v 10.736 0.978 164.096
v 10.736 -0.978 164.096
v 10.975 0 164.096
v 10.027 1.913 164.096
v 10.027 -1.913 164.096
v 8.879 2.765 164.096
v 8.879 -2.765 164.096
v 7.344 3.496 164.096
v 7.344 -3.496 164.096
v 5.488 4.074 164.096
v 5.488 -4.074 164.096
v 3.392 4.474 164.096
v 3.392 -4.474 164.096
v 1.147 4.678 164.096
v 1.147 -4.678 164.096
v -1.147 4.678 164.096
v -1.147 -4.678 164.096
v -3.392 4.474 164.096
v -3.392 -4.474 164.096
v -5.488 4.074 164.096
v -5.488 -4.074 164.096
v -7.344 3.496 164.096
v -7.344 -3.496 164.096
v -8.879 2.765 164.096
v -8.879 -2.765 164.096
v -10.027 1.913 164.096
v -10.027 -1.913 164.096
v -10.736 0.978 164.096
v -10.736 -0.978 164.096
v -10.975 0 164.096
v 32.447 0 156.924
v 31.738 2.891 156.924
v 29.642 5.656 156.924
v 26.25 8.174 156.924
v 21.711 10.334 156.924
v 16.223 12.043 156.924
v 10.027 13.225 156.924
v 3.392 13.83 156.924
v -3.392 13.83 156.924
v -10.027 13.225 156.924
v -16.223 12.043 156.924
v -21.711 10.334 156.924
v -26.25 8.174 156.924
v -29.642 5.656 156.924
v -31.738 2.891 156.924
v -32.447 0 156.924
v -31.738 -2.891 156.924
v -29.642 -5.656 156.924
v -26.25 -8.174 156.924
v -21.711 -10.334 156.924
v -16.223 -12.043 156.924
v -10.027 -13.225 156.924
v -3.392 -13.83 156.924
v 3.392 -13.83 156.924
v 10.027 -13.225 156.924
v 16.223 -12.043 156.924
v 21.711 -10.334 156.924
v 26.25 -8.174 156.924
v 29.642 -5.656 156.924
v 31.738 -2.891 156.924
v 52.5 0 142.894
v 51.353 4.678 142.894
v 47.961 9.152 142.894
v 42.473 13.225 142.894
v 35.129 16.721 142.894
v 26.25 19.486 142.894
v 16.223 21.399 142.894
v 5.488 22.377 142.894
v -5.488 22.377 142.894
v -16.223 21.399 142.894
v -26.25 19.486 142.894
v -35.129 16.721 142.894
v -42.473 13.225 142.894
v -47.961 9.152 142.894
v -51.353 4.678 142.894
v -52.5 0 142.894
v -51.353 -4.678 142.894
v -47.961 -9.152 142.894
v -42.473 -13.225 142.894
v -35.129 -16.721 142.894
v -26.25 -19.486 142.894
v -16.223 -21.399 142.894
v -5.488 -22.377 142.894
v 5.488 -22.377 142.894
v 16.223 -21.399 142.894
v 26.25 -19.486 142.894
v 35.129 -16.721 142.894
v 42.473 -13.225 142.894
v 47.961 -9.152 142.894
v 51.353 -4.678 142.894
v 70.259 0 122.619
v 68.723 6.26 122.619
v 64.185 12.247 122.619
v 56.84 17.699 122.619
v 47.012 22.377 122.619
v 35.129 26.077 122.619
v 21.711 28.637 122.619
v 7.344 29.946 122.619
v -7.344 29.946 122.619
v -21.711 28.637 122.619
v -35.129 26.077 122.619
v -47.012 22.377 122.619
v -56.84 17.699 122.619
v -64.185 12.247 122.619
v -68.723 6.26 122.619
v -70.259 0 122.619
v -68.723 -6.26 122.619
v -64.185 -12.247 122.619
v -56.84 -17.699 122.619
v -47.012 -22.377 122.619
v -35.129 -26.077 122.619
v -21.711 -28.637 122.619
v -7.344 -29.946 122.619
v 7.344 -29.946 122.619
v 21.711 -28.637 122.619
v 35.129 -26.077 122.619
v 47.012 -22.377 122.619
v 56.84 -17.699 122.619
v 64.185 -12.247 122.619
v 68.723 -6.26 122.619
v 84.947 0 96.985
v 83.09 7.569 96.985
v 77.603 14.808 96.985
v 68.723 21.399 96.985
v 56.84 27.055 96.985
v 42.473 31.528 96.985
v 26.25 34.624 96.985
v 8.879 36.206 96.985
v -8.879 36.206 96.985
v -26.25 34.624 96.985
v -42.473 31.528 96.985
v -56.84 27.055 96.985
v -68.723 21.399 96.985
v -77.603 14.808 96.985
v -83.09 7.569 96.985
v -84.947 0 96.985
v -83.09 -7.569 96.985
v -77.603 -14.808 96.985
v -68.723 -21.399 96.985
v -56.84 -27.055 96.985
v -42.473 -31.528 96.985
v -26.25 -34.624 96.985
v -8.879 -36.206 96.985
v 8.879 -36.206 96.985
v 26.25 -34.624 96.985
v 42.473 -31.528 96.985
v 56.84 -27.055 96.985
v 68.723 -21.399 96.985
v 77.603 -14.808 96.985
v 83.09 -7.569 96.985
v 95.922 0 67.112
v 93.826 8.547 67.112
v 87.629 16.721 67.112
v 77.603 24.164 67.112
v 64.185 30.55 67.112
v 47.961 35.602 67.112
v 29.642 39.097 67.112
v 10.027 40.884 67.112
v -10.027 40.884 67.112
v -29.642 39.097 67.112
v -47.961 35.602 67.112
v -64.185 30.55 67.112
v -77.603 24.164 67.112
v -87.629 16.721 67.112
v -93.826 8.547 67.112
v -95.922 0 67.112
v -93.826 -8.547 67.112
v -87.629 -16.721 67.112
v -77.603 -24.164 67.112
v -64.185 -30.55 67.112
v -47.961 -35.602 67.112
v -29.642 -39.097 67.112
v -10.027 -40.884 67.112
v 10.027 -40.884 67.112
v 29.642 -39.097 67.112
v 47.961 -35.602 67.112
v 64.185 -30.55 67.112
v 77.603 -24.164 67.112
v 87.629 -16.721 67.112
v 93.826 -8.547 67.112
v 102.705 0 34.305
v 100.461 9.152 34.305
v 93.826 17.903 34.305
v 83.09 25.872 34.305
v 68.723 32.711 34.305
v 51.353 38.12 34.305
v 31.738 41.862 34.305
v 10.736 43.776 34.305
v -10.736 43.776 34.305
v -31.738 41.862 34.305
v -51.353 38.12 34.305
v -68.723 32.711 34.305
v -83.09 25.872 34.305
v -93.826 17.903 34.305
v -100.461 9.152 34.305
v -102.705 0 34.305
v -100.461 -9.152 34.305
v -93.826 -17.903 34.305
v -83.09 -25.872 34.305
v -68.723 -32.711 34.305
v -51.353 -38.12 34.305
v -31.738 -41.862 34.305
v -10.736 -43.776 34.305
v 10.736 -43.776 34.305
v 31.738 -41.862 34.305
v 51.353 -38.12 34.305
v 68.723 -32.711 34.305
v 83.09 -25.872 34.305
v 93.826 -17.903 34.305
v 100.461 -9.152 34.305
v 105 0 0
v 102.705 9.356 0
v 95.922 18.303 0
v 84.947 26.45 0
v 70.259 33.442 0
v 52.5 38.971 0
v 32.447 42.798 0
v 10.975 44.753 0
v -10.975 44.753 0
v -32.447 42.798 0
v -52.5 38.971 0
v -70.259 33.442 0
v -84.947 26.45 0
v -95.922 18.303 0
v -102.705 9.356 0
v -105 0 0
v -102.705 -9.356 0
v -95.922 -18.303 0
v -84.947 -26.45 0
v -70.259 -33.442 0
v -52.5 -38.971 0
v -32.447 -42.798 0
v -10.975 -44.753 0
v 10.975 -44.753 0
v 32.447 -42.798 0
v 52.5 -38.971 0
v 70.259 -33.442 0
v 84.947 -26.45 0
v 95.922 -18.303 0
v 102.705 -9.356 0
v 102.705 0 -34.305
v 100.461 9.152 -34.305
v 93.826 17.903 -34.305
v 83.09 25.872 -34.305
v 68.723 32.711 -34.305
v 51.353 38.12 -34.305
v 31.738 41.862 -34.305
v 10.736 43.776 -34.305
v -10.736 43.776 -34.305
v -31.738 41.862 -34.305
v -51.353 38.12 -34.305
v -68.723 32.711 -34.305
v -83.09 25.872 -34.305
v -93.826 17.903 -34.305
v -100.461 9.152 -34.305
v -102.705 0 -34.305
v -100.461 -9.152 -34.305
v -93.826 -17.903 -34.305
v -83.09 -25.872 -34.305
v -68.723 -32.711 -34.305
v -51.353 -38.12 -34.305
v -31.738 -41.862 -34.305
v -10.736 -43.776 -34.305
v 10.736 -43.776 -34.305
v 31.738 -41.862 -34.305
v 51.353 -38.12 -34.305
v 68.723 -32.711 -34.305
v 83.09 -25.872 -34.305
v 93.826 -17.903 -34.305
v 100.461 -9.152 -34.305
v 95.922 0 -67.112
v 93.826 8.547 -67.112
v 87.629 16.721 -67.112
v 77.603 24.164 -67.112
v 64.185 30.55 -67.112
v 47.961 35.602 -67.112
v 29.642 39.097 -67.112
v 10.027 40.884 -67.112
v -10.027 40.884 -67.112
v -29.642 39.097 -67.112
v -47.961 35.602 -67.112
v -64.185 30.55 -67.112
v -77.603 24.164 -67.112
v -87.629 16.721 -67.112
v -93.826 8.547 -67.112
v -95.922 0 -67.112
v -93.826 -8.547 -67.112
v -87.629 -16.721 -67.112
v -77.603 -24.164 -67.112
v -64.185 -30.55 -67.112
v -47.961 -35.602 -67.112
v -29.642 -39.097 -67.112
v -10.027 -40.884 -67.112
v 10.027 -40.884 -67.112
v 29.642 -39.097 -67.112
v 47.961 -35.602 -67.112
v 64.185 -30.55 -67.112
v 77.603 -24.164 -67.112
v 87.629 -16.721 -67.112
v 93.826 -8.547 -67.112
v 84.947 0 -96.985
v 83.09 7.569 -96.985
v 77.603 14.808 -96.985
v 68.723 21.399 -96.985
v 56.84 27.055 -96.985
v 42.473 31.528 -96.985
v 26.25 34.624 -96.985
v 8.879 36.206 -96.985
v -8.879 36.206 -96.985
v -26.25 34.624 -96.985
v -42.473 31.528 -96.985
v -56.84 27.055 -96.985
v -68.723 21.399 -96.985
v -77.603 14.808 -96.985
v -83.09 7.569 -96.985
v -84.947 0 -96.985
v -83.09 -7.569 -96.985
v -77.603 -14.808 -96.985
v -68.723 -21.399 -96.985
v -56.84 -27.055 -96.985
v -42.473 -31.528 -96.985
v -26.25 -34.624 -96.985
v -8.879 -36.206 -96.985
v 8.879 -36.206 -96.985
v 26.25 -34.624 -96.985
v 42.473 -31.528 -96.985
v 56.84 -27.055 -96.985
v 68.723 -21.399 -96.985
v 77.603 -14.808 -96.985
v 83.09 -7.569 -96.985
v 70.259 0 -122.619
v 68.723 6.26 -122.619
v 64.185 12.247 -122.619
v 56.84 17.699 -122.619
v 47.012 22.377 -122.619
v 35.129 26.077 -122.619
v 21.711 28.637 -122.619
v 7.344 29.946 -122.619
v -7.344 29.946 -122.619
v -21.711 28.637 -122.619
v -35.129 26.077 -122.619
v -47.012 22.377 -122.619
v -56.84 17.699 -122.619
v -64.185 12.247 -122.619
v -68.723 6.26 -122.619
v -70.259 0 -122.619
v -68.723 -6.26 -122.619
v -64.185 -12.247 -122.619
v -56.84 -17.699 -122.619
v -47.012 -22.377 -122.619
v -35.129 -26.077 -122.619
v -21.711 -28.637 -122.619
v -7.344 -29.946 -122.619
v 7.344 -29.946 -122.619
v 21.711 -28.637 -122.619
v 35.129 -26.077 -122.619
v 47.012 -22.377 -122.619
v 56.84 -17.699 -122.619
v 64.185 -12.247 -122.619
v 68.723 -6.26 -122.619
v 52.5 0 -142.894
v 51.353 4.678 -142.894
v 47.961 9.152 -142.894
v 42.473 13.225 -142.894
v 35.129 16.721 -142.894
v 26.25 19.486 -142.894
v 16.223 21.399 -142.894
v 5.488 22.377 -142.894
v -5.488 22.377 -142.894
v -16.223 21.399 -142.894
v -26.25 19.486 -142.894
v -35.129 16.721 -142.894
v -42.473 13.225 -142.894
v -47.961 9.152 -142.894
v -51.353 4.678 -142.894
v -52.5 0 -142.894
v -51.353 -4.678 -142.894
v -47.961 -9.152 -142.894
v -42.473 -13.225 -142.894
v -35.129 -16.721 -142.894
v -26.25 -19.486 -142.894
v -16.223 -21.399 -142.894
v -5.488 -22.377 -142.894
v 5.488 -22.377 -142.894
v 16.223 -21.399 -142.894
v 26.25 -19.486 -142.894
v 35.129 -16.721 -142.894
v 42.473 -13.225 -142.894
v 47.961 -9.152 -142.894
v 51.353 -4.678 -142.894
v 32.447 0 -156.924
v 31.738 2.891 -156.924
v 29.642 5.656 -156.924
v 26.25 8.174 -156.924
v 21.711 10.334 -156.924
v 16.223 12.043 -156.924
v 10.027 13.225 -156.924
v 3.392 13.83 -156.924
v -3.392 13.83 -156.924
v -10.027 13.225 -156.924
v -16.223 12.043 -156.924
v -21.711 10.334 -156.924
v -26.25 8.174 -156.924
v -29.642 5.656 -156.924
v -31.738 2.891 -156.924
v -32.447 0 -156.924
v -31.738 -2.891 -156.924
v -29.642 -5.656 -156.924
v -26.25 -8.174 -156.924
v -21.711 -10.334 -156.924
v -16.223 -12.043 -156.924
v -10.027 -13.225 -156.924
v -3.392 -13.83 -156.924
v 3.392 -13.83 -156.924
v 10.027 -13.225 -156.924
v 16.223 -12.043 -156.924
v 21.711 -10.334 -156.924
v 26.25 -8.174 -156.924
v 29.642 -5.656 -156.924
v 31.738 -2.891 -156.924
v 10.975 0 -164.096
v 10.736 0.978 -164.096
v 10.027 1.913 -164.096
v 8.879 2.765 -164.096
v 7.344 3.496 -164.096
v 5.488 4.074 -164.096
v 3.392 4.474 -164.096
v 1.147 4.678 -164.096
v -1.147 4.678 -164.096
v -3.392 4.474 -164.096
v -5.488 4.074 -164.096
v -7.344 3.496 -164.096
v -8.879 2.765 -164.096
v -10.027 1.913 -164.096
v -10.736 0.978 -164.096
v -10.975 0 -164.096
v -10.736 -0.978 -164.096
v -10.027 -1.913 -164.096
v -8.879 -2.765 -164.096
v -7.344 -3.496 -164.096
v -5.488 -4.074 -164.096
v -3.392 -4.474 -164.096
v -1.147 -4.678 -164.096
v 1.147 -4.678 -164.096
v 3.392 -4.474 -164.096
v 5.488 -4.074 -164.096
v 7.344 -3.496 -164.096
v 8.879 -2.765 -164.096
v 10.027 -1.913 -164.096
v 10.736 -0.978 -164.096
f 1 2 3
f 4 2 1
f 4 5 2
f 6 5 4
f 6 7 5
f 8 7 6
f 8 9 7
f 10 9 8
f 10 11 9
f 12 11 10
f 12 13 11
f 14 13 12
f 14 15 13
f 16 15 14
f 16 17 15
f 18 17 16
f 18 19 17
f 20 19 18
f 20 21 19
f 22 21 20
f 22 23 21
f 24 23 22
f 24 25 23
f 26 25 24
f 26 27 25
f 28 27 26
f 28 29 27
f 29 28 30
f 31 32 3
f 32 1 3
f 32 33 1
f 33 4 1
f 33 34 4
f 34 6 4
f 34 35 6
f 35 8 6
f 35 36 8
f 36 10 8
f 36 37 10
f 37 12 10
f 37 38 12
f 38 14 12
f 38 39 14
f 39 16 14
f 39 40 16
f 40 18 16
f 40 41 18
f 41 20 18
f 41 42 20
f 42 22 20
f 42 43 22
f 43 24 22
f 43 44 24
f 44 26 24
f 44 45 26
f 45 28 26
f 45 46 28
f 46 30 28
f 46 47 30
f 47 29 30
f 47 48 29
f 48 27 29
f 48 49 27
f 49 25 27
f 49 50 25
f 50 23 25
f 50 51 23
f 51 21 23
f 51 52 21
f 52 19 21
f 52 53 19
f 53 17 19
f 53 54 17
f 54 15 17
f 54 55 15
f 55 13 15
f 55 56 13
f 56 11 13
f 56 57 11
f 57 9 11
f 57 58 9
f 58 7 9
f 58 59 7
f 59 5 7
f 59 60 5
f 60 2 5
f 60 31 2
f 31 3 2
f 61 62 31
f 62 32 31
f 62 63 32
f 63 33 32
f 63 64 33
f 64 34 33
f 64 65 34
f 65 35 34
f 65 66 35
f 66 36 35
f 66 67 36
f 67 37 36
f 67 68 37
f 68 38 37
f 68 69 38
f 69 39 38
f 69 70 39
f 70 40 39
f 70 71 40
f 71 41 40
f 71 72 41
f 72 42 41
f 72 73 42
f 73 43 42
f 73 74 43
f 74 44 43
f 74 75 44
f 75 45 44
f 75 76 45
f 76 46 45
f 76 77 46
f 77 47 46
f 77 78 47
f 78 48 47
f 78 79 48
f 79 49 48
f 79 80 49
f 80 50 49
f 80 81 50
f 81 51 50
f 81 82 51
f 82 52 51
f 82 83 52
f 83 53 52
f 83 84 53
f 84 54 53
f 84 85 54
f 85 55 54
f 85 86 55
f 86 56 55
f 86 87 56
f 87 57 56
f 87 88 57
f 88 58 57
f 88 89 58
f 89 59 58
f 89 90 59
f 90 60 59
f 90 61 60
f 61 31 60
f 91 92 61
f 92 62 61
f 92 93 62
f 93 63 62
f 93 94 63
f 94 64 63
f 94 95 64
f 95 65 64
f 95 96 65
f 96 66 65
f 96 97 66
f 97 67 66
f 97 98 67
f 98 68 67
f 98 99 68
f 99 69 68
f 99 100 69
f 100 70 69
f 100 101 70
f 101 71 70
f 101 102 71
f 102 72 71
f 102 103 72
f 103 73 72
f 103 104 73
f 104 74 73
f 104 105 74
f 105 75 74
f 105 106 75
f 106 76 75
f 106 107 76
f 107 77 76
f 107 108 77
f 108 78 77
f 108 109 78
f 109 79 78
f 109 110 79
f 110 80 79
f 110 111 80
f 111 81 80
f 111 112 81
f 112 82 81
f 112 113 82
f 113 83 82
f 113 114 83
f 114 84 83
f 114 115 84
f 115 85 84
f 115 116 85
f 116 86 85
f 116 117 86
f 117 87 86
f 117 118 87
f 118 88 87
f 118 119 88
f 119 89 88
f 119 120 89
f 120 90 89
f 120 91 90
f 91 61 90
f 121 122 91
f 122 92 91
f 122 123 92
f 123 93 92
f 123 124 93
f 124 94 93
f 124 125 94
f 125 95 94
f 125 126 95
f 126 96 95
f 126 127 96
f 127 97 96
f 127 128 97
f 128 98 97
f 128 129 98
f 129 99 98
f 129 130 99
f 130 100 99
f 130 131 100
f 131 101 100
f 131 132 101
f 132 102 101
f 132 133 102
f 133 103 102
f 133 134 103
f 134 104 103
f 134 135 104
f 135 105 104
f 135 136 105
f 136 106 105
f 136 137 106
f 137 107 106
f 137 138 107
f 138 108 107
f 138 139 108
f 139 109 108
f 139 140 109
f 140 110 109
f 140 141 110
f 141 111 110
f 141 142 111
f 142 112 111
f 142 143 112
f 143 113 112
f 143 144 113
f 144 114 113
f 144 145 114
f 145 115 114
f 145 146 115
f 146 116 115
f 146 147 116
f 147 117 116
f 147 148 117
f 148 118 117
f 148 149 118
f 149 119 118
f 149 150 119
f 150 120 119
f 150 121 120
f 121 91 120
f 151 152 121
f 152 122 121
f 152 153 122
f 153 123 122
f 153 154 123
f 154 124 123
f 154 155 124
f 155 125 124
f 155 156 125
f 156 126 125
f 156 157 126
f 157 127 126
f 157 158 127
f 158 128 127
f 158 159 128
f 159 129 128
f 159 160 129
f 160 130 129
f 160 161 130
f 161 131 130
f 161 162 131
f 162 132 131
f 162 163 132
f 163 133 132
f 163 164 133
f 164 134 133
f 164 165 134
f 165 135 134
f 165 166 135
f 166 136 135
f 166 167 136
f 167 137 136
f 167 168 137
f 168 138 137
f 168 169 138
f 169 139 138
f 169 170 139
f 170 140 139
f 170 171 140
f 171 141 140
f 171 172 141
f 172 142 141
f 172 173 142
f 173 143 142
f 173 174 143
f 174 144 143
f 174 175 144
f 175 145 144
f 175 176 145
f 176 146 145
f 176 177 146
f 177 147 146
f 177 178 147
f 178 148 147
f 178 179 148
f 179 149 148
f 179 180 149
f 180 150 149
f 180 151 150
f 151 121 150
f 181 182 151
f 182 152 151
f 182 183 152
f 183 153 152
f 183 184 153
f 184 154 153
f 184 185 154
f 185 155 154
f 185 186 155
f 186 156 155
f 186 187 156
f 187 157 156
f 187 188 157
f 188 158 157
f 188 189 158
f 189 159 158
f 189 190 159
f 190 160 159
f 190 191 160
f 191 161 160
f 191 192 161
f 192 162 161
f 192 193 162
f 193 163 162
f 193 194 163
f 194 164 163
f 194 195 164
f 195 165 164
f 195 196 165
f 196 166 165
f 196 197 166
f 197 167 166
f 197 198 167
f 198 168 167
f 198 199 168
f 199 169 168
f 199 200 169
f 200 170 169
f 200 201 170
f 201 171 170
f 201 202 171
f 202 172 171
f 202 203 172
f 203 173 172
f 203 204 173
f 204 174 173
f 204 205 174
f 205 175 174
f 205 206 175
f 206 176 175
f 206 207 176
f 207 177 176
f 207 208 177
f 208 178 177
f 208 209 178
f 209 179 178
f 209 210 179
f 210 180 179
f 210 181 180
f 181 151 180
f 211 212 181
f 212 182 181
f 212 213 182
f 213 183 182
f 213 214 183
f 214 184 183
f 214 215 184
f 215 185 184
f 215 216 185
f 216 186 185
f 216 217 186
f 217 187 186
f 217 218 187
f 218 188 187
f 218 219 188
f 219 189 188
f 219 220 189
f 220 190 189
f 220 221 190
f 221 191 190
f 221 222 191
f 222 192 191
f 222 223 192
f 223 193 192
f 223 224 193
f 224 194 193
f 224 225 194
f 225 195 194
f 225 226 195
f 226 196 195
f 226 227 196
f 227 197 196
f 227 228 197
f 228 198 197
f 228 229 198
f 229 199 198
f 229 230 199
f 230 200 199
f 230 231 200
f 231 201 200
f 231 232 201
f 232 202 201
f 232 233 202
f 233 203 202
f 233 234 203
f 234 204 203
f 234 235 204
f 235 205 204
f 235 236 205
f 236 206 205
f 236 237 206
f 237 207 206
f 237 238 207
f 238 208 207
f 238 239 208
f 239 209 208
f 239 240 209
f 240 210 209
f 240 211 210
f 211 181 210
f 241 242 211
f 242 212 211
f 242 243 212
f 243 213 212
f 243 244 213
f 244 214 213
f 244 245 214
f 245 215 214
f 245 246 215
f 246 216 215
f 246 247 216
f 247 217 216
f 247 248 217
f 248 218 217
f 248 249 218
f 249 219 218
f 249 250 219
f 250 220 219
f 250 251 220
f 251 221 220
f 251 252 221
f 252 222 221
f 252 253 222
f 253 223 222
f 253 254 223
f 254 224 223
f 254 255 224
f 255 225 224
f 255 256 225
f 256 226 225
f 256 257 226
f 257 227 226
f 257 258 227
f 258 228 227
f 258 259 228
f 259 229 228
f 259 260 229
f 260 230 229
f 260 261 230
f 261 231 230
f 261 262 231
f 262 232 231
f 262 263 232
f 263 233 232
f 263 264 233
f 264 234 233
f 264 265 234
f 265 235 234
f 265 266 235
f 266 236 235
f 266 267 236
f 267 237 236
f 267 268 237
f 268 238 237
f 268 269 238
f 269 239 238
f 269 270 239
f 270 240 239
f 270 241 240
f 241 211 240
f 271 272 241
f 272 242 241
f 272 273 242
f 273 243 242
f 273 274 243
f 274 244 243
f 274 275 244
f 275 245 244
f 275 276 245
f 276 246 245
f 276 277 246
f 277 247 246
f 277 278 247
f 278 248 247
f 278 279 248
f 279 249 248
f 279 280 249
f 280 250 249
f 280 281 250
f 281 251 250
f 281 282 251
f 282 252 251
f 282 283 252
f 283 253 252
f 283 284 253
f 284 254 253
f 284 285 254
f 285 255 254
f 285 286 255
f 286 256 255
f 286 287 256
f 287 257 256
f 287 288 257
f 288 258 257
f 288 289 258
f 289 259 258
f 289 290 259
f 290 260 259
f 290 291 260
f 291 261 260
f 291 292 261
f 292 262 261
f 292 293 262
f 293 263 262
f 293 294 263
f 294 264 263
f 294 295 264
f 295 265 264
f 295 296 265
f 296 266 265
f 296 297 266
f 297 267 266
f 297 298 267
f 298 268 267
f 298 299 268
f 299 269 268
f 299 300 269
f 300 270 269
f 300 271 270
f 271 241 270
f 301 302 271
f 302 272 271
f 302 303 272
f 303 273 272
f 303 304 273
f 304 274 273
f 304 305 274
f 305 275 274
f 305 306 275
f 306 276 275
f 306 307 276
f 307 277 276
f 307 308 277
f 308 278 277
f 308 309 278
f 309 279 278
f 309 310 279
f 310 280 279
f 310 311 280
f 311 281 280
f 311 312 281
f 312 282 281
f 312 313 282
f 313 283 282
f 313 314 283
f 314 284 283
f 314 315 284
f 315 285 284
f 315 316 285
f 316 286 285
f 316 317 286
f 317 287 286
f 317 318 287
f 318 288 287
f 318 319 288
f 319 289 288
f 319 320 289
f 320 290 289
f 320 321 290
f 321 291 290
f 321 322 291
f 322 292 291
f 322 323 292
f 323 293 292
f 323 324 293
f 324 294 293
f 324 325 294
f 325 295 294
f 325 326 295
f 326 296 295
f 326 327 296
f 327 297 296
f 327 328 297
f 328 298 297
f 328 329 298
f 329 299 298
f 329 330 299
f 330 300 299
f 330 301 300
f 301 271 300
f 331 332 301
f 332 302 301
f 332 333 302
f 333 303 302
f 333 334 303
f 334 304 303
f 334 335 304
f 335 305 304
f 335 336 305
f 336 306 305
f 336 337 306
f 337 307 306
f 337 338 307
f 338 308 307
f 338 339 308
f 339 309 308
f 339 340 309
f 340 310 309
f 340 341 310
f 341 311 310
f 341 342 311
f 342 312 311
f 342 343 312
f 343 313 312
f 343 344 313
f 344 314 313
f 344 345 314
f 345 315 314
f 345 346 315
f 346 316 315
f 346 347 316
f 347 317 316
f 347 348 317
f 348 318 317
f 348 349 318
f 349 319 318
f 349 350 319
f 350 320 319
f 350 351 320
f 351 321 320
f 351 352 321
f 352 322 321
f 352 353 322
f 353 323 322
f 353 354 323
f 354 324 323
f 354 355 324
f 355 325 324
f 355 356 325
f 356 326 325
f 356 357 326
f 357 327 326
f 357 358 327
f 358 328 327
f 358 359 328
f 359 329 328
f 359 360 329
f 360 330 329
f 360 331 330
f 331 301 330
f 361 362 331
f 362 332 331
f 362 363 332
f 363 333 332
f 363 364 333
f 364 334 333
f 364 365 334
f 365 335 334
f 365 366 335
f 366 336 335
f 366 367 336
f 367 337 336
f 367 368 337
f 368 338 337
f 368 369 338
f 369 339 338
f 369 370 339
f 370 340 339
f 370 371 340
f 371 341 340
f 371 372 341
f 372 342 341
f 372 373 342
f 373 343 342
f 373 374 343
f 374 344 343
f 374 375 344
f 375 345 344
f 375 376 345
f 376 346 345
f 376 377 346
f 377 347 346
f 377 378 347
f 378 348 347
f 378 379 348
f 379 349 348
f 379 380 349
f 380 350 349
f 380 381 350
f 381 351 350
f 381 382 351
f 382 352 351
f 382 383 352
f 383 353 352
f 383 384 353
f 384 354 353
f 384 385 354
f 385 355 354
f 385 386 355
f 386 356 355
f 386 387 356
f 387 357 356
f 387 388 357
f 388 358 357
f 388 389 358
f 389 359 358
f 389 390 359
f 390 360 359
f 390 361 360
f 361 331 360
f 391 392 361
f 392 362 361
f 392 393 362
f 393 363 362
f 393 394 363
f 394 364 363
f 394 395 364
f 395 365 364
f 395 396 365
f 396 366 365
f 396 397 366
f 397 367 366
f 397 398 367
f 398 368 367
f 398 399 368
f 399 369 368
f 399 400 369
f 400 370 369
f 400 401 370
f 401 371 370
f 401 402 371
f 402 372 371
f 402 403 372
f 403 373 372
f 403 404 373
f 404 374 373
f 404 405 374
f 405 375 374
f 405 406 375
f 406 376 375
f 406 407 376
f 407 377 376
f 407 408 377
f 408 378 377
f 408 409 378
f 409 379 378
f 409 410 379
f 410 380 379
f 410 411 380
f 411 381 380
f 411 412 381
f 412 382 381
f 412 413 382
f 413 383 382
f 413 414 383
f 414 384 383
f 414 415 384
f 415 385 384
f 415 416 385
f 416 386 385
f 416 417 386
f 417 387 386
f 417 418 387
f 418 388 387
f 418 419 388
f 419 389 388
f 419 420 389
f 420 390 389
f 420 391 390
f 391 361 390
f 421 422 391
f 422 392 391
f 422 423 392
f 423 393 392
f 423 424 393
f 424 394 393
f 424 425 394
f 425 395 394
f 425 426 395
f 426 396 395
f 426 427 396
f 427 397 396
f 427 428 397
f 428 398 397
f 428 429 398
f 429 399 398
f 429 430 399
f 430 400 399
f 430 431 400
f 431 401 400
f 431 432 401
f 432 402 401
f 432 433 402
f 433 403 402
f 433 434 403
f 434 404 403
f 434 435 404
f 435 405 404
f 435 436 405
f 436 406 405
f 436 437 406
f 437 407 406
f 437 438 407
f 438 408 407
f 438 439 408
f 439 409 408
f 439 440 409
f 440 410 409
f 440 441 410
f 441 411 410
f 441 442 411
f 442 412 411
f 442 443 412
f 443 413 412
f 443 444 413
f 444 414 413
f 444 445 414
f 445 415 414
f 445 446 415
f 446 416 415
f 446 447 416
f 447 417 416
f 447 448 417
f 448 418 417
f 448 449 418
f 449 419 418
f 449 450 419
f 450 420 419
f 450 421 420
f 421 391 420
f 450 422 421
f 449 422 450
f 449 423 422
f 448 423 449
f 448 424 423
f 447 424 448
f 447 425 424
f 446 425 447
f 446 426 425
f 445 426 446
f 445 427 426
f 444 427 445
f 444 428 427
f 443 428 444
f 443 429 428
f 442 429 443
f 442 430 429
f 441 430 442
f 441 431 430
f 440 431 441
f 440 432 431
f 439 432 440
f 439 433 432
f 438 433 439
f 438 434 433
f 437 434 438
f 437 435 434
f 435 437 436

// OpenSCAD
// Generated by SolidPython 1.0.1 on 2020-07-29 00:46:47


scale(v = [7, 3, 11]) {
	sphere(r = 15);
}
/***********************************************
*********      SolidPython code:      **********
************************************************
 
# import packages: SolidPython
from solid import *
from solid.utils import *
from itertools import chain, combinations, permutations


class Resize:

    def __init__(self, scad_file):
        self.scad_file = scad_file
        #self.scad_file = import_scad(scad_file)
        # cone/cylinder param:
        self.r1 = 0
        self.r2 = 0
        self.h = 0
        # rectangular prism param:
        self.w = 0
        self.l = 0
        # ellipse param:
        self.r = 0

    # import OpenScad code (file name corresponds to shape)


    # classify shape + parameters
    def assign(self, param1, param2, param3):
        if self.scad_file == 'cone.scad':
            self.r1 = param1
            self.r2 = param2
            self.h = param3
        elif self.scad_file == 'cylinder.scad':
            self.r1 = param1
            self.r2 = param2
            self.h = param3
        elif self.scad_file == 'rectangularPrism.scad':
            self.h = param1
            self.l = param2
            self.w = param3
        else:
            self.r = param1
            self.h = param2

    # resize parameters
    def iterate(self):
        x = range(3, 20, 2)
        i = 1
        if self.scad_file == 'cone.scad':
            tempList = list(permutations(x, 2))
            for temp in tempList:
                param1 = temp[0]
                param2 = temp[1]
                filepath = 'produced_scad_files/' + 'cone' + str(param1) + '_' + str(param2) + '_' + '.scad'
                scad_render_to_file(cylinder(h=param1, r1=param2, r2=0), filepath)

        elif self.scad_file == 'cylinder.scad':
            tempList = list(permutations(x, 3))
            for temp in tempList:
                param1 = temp[0]
                param2 = temp[1]
                filepath = 'produced_scad_files/' + 'cylinder' + str(param1) + '_' + str(param2) + '_' + '.scad'
                scad_render_to_file(cylinder(h=param1, r1=param2, r2=param2), filepath)

        elif self.scad_file == 'rectangularPrism.scad':
            tempList = list(permutations(x, 3))
            for temp in tempList:
                param1 = temp[0]
                param2 = temp[1]
                param3 = temp[2]
                filepath = 'produced_scad_files/' + 'rectangularPrism' + str(param1) + '_' + str(param2) + '_' + str(
                    param3) + '.scad'
                scad_render_to_file(cube(size=(param1, param2, param3)), filepath)

        elif self.scad_file == 'ellipse.scad':
            tempList = list(permutations(x, 4))
            for temp in tempList:
                param1 = temp[0]
                param2 = temp[1]
                param3 = temp[2]
                param4 = temp[3]
                filepath = 'produced_scad_files/' + 'ellipse' + str(param1) + '_' + str(param2) + '_' + str(param3) + '_' + str(param4) + '.scad'
                scad_render_to_file(scale([param1, param2, param3])(sphere(r=param4)), filepath)

    def render_to_scadfile(self):
        scad_render_to_file(scad, 'example.scad') 
 
************************************************/
